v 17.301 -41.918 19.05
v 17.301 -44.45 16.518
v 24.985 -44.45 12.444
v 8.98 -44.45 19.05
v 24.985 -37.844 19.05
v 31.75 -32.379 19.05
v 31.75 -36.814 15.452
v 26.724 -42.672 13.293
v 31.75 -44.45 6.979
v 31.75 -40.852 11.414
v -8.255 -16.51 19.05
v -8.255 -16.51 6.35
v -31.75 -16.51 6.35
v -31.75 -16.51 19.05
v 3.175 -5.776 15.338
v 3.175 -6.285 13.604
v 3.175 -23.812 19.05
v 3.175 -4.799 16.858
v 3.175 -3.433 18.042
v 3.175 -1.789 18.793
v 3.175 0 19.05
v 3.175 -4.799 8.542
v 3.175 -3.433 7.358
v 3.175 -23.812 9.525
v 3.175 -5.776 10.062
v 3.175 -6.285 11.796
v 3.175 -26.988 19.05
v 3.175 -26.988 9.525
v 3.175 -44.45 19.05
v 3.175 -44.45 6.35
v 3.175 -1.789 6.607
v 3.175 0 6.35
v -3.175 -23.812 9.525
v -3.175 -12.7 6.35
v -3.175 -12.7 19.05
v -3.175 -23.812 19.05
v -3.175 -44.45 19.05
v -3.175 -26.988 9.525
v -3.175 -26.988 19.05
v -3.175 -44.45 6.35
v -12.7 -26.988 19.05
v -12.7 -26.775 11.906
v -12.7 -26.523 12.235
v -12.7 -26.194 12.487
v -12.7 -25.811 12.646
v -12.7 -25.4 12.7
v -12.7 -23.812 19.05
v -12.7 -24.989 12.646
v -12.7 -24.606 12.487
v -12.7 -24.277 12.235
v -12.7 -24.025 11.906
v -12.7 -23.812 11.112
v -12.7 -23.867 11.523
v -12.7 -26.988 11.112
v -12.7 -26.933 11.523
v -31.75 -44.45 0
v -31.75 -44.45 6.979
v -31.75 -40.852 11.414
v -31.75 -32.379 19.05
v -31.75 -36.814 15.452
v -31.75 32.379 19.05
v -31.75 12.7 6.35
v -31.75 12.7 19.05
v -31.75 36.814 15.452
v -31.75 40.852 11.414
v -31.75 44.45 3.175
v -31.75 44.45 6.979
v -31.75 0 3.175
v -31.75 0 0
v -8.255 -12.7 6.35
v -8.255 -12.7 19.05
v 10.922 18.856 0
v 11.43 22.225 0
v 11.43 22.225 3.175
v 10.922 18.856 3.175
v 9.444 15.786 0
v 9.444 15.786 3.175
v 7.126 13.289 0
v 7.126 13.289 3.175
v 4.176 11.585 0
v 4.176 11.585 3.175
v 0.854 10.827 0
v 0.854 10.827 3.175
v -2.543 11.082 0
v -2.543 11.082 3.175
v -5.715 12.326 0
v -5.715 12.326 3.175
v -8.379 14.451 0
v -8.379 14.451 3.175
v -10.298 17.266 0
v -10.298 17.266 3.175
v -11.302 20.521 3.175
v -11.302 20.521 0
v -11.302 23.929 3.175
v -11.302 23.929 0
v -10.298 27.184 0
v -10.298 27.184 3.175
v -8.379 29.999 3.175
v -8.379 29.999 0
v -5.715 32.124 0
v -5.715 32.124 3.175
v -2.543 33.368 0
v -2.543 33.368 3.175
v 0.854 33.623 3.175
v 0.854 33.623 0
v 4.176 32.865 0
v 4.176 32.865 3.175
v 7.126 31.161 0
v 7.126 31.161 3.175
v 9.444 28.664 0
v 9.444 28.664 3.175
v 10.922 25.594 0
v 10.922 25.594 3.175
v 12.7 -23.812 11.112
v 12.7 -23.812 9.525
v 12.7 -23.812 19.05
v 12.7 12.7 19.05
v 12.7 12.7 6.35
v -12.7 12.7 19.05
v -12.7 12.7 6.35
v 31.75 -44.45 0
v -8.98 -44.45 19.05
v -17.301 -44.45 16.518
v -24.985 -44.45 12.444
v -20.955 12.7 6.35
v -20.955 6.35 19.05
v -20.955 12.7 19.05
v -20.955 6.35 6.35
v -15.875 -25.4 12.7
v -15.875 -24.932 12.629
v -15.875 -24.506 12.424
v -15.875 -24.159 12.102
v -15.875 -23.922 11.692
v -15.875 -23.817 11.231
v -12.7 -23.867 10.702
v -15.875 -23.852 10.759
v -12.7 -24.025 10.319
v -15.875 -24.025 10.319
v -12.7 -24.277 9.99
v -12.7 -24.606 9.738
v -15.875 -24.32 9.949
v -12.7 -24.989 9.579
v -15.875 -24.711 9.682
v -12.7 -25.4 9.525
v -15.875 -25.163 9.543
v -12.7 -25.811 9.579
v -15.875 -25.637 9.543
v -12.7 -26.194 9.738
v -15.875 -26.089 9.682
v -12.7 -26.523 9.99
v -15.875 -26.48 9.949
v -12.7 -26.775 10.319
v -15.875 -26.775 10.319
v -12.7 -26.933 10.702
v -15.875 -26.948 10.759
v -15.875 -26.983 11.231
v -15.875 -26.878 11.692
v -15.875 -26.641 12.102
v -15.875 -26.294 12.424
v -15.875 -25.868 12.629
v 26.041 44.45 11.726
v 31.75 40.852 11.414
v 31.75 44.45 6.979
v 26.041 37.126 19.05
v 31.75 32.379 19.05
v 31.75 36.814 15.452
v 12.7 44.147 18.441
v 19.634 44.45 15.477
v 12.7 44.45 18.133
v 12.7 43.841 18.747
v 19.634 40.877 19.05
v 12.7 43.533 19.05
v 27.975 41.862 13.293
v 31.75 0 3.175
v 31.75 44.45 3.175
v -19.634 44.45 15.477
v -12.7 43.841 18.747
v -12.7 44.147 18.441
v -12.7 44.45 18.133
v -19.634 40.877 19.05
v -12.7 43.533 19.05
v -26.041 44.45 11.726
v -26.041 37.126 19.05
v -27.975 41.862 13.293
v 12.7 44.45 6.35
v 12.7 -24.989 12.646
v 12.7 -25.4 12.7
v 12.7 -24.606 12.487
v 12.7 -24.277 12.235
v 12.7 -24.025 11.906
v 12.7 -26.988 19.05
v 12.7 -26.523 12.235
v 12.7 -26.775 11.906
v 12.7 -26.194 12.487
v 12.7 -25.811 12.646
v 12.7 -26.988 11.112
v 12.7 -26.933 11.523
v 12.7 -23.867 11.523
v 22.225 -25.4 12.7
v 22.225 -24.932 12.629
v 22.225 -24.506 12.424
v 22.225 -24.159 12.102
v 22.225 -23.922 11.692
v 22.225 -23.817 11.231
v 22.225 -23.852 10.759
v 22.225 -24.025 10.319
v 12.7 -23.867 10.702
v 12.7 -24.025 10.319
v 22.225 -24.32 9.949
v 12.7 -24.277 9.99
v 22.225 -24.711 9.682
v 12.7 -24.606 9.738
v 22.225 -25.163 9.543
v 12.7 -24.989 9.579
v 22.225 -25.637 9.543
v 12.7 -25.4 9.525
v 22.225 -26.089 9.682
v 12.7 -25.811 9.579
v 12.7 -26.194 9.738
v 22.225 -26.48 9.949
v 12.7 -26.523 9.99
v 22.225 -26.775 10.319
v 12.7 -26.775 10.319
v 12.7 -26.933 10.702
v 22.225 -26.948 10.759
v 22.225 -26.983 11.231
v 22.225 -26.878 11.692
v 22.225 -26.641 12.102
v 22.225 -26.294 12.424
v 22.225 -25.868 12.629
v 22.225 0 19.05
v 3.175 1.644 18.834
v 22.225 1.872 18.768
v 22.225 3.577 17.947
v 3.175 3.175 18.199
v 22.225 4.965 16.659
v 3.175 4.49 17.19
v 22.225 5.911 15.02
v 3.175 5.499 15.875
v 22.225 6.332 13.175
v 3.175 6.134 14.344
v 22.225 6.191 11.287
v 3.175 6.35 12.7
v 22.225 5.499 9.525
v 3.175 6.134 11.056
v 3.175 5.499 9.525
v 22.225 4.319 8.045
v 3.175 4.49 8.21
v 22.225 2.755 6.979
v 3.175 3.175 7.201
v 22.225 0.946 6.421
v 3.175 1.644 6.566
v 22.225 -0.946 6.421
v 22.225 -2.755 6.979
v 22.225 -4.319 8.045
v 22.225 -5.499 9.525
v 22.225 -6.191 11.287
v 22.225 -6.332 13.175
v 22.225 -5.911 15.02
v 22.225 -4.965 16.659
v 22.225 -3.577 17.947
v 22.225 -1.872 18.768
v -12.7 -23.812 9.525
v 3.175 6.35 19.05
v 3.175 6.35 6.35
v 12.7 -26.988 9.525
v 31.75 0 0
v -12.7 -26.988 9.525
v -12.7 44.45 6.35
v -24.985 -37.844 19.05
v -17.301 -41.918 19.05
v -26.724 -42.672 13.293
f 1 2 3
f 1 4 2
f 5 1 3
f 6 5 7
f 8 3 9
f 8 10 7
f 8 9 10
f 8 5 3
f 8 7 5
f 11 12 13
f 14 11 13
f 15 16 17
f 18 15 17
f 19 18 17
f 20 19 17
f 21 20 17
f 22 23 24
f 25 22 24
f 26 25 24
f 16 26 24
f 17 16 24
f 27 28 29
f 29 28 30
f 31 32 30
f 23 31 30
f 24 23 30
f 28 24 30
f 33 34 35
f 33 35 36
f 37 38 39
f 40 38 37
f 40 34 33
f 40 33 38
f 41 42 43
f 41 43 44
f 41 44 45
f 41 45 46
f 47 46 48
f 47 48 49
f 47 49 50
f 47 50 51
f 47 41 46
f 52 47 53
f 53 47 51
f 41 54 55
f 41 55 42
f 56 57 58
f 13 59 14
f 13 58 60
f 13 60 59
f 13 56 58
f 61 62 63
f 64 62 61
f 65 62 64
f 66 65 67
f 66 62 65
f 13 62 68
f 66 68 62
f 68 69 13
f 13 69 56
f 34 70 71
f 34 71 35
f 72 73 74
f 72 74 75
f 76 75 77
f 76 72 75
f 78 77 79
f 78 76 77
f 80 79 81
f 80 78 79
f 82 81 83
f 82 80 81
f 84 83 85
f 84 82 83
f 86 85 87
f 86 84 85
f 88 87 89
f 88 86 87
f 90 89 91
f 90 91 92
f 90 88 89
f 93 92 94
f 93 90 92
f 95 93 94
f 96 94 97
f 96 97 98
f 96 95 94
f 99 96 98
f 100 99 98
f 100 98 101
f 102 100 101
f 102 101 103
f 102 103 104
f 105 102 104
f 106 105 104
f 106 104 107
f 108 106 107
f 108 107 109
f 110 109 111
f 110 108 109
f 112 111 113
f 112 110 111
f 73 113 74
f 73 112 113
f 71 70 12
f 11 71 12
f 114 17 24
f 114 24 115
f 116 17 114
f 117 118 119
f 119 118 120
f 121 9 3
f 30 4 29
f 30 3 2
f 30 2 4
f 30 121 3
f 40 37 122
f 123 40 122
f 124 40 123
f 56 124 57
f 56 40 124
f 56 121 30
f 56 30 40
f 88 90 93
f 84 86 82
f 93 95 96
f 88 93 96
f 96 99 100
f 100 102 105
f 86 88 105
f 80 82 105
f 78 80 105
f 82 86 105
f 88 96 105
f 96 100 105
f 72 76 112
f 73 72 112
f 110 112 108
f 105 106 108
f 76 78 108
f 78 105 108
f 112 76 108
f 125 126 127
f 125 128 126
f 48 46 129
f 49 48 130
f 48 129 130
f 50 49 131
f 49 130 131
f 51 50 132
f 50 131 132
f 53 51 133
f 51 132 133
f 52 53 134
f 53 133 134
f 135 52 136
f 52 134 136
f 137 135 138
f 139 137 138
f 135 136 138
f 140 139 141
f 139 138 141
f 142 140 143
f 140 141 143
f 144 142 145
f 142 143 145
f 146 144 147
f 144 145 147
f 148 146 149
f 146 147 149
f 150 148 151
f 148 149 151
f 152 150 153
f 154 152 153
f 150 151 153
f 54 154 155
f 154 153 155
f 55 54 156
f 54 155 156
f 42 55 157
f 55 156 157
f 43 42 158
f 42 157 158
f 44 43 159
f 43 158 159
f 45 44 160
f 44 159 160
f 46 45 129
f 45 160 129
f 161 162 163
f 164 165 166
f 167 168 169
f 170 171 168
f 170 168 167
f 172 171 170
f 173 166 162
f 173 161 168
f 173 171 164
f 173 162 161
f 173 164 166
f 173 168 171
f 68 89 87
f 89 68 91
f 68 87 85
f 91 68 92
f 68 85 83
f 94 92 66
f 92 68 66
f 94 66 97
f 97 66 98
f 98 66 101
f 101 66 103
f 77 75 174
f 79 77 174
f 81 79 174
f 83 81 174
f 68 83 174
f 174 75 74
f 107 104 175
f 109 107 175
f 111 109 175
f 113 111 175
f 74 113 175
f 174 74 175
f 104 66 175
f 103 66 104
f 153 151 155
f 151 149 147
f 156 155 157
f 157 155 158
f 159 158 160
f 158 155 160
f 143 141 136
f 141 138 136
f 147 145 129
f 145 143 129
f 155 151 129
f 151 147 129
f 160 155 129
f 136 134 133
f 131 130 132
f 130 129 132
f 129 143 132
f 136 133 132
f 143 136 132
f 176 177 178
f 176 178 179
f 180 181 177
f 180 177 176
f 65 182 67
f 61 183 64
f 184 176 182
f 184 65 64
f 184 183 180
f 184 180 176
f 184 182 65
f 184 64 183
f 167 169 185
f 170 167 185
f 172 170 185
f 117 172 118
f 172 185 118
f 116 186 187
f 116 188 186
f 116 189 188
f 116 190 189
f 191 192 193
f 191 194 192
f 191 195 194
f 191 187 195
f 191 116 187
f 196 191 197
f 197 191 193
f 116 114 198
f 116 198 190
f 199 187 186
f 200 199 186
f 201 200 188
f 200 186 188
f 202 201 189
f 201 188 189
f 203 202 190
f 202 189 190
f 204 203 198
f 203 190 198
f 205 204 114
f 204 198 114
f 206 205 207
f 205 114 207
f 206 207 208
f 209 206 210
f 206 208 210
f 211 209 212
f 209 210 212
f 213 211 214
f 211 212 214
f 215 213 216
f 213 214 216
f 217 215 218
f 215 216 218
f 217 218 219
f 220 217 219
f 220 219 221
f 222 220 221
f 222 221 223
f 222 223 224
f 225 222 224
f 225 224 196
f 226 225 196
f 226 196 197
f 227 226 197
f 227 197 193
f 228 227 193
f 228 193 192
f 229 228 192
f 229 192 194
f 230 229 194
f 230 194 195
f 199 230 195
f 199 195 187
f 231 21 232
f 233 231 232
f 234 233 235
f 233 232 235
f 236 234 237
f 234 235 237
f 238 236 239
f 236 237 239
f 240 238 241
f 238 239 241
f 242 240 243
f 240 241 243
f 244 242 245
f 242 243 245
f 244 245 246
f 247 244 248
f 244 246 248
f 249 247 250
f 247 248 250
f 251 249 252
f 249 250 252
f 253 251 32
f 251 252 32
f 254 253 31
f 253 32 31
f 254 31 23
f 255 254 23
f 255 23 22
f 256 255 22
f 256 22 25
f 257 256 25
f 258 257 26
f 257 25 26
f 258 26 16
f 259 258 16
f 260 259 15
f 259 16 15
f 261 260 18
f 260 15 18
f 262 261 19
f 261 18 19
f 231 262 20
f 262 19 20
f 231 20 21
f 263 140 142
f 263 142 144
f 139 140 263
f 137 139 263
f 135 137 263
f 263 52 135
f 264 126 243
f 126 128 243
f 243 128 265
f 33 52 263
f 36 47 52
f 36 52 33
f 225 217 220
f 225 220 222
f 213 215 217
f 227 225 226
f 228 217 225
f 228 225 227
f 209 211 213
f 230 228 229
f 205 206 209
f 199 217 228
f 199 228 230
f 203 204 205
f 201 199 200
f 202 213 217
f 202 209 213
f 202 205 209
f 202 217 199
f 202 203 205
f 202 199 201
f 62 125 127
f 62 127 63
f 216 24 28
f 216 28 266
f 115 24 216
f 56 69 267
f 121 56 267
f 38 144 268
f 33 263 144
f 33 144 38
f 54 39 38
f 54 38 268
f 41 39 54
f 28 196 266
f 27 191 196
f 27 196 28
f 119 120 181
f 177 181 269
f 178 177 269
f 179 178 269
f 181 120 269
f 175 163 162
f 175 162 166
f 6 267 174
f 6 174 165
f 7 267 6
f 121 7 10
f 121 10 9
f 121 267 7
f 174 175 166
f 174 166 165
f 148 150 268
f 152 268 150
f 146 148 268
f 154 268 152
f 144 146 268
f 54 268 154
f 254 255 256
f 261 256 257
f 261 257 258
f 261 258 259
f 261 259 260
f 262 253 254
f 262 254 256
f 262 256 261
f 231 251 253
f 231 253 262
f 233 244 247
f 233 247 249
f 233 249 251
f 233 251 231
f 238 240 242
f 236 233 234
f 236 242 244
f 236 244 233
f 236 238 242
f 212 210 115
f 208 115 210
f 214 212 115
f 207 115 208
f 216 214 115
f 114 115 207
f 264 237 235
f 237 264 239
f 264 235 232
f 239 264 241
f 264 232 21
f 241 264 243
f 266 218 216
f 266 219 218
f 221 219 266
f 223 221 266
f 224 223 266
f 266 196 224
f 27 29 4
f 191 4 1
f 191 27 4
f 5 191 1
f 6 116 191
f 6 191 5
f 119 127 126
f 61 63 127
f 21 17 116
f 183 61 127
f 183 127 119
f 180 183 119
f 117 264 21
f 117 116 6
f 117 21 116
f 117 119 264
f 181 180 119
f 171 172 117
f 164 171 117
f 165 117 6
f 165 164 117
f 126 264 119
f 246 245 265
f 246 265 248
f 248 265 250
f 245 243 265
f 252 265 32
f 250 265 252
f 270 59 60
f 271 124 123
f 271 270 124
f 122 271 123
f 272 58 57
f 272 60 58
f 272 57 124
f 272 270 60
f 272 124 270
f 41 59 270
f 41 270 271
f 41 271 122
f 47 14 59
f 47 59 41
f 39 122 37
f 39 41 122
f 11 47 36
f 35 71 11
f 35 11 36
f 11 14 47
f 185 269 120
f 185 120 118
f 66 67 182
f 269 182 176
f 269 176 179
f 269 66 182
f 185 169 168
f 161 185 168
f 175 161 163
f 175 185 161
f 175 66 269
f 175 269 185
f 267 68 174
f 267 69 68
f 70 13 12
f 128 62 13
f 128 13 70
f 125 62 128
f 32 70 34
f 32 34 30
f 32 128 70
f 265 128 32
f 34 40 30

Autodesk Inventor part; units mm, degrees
ref_plane "YZ Plane" through (0, 0, 0) normal (1, 0, 0) x (0, 1, 0)
ref_plane "XZ Plane" through (0, 0, 0) normal (0, 1, 0) x (-1, 0, 0)
ref_plane "XY Plane" through (0, 0, 0) normal (0, 0, 1) x (1, 0, 0)
sketch "Sketch1" plane through (0, 0, 0) normal (0, 0, 1) x (1, 0, 0)
  line L0 (31.75, -44.45) -> (-31.75, -44.45)
  line L1 (-31.75, -44.45) -> (-31.75, 44.45)
  line L2 (-31.75, 44.45) -> (31.75, 44.45)
  line L3 (31.75, 44.45) -> (31.75, -44.45)
  line L4 (31.75, -44.45) -> (-31.75, 44.45) construction
  line L5 (-31.75, -44.45) -> (31.75, 44.45) construction
  line L6 (-31.75, 0) -> (31.75, 0)
  line L7 (-31.75, 44.45) -> (31.75, 0)
  line L8 (-31.75, 0) -> (31.75, 44.45)
  circle A0 centre (0, 22.225) radius 11.43
  point P0 (0, 0)
  dimension "d0" = 63.5
  dimension "d1" = 44.45
  dimension "d2" = 22.86
extrude "Extrusion1" add sketch "Sketch1" along normal blind 3.175 contours L0 L1 L6 L3 | A0 L8 L7 | L7 L8 A0 | A0 L7 L8 | L8 L7 A0
sketch "Sketch2" plane through (0, 0, 3.175) normal (0, 0, 1) x (1, 0, 0)
  line L0 (31.75, -44.45) -> (31.75, 0) projected
  line L1 (31.75, 0) -> (-31.75, 0) projected
  line L2 (-31.75, 0) -> (-31.75, -44.45) projected
  line L3 (-31.75, -44.45) -> (31.75, -44.45) projected
  line L4 (-31.75, 44.45) -> (31.75, 44.45)
  line L5 (31.75, 44.45) -> (31.75, -44.45)
  line L6 (31.75, -44.45) -> (-31.75, -44.45)
  line L7 (-31.75, -44.45) -> (-31.75, 44.45)
  line L8 (-31.75, 44.45) -> (31.75, -44.45) construction
  line L9 (31.75, 44.45) -> (-31.75, -44.45) construction
  point P0 (0, 0)
extrude "Extrusion2" add sketch "Sketch2" along normal blind 3.175
sketch "Sketch3" plane through (0, 0, 6.35) normal (0, 0, 1) x (1, 0, 0)
  circle A0 centre (0, -0.4493) radius 54.991
  line L0 (0, -0.4493) -> (0, 0)
  line L1 (31.75, -44.45) -> (31.75, 44.45) projected
  line L2 (31.75, 44.45) -> (-31.75, 44.45) projected
  line L3 (-31.75, 44.45) -> (-31.75, -44.45) projected
  line L4 (-31.75, -44.45) -> (31.75, -44.45) projected
  line L5 (-31.75, -44.45) -> (31.75, -44.45) projected
  line L6 (0, 44.45) -> (0, -44.45)
  line L7 (31.75, 0) -> (-31.75, 0) projected
  line L8 (-31.75, 0) -> (31.75, 0)
  line L9 (12.7, 12.7) -> (-12.7, 12.7)
  line L10 (-12.7, 12.7) -> (-12.7, 44.45)
  line L11 (-12.7, 44.45) -> (12.7, 44.45)
  line L12 (12.7, 44.45) -> (12.7, 12.7)
  line L13 (12.7, 12.7) -> (-12.7, 44.45) construction
  line L14 (-12.7, 12.7) -> (12.7, 44.45) construction
  line L15 (-33.655, 6.35) -> (-8.255, 6.35)
  line L16 (-8.255, 6.35) -> (-8.255, -16.51)
  line L17 (-8.255, -16.51) -> (-33.655, -16.51)
  line L18 (-33.655, -16.51) -> (-33.655, 6.35)
  line L19 (-8.255, 6.35) -> (31.75, 6.35)
  line L20 (-8.255, -12.7) -> (-3.175, -12.7)
  line L21 (-3.175, -12.7) -> (-3.175, -44.45)
  line L22 (-20.955, 6.35) -> (-20.955, 12.7)
  line L23 (-20.955, 12.7) -> (-31.75, 12.7)
  line L24 (3.175, 6.35) -> (3.175, -44.45)
  point P0 (0, -55.4403)
  point P1 (0, 28.575)
  point P2 (3.175, -44.45)
  point P3 (-3.175, -44.45)
  point P4 (-31.75, -16.51)
  dimension "d8" = 109.982
  dimension "d9" = 25.4
  dimension "d10" = 31.75
  dimension "d11" = 25.4
  dimension "d12" = 8.255
  dimension "d13" = 6.35
  dimension "d14" = 22.86
  dimension "d15" = 5.08
  dimension "d16" = 19.05
  dimension "d17" = 6.35
extrude "Extrusion3" add sketch "Sketch3" along normal blind 12.7 contours L1 L19 L6 L9 L12 L2 | L2 L10 L9 L6 L19 L15 L22 L23 L3 | L1 L7 L24 L19 | L1 L4 L24 L7 | L17 L16 L20 L21 L4 L3
sketch "Sketch4" plane through (0, 0, 19.05) normal (0, 0, 1) x (1, 0, 0)
  line L0 (-20.955, 12.7) -> (-20.955, 6.35) projected
  line L1 (-20.955, 6.35) -> (3.175, 6.35) projected
  line L2 (3.175, 6.35) -> (3.175, -44.45) projected
  line L3 (3.175, -44.45) -> (31.75, -44.45) projected
  line L4 (31.75, -44.45) -> (31.75, 44.45) projected
  line L5 (31.75, 44.45) -> (12.7, 44.45) projected
  line L6 (12.7, 44.45) -> (12.7, 12.7) projected
  line L7 (12.7, 12.7) -> (-12.7, 12.7) projected
  line L8 (-12.7, 12.7) -> (-12.7, 44.45) projected
  line L9 (-12.7, 44.45) -> (-31.75, 44.45) projected
  line L10 (-31.75, 44.45) -> (-31.75, 12.7) projected
  line L11 (-31.75, 12.7) -> (-20.955, 12.7) projected
  line L12 (-3.175, -12.7) -> (-8.255, -12.7) projected
  line L13 (-8.255, -12.7) -> (-8.255, -16.51) projected
  line L14 (-8.255, -16.51) -> (-31.75, -16.51) projected
  line L15 (-31.75, -16.51) -> (-31.75, -44.45) projected
  line L16 (-31.75, -44.45) -> (-3.175, -44.45) projected
  line L17 (-3.175, -44.45) -> (-3.175, -12.7) projected
  line L18 (3.175, -44.45) -> (3.175, 6.35) projected
  line L19 (3.175, 6.35) -> (-20.955, 6.35) projected
  line L20 (-20.955, 6.35) -> (-20.955, 12.7) projected
  line L21 (-20.955, 12.7) -> (-31.75, 12.7) projected
  line L22 (-31.75, 12.7) -> (-31.75, -16.51) projected
  line L23 (-31.75, -16.51) -> (-8.255, -16.51) projected
  line L24 (-8.255, -16.51) -> (-8.255, -12.7) projected
  line L25 (-8.255, -12.7) -> (-3.175, -12.7) projected
  line L26 (-3.175, -12.7) -> (-3.175, -44.45) projected
  line L27 (-3.175, -44.45) -> (3.175, -44.45) projected
  line L28 (31.75, 0) -> (-31.75, 0) projected
  line L29 (-31.75, -25.4) -> (31.75, -25.4)
  line L30 (0, 0) -> (0, -44.45)
  line L31 (12.7, -26.9875) -> (-12.7, -26.9875)
  line L32 (-12.7, -26.9875) -> (-12.7, -23.8125)
  line L33 (-12.7, -23.8125) -> (12.7, -23.8125)
  line L34 (12.7, -23.8125) -> (12.7, -26.9875)
  line L35 (12.7, -26.9875) -> (-12.7, -23.8125) construction
  line L36 (-12.7, -26.9875) -> (12.7, -23.8125) construction
  point P0 (0, -25.4)
  dimension "d20" = 25.4
  dimension "d21" = 3.175
  dimension "d22" = 25.4
extrude "Extrusion4" cut sketch "Sketch4" against normal blind 9.525 contours L33 L34 L29 L2 | L2 L29 L30 L33 | L30 L29 L17 L33 | L29 L34 L31 L2 | L2 L31 L30 L29 | L32 L33 L17 L29 | L29 L17 L31 L32 | L30 L31 L17 L29
sketch "Sketch5" plane through (0, 0, 0) normal (0, 1, 0) x (-1, 0, 0)
  line L0 (-31.75, 3.175) -> (31.75, 3.175) projected
  line L1 (31.75, 3.175) -> (31.75, 19.05) projected
  line L2 (12.7, 19.05) -> (31.75, 19.05) projected
  line L3 (12.7, 6.35) -> (12.7, 19.05) projected
  line L4 (-12.7, 6.35) -> (12.7, 6.35) projected
  line L5 (-12.7, 6.35) -> (-12.7, 19.05) projected
  line L6 (-31.75, 19.05) -> (-12.7, 19.05) projected
  line L7 (-31.75, 3.175) -> (-31.75, 19.05) projected
  circle A0 centre (0, -25.4) radius 63.5
  line L8 (0, 0) -> (0, -25.4)
  circle A1 centre (0, -25.4) radius 114.3
  line L9 (0, -25.4) -> (114.3, -25.4)
  line L10 (0, -25.4) -> (0, 88.9)
  point P0 (0, 38.1)
  point P1 (63.5, -25.4)
  dimension "d25" = 28.575
  dimension "d26" = 127
  dimension "d27" = 50.8
revolve "Revolution1" cut sketch "Sketch5" angle 360 about axis through (0, 0, -25.4) along (0, 0, 1) picked at (44.2136, 61.1262) contours L10 A1 L9 A0
sketch "Sketch7" plane through (3.175, -44.45, 6.35) normal (-1, 0, 0) x (0, 0, 1)
  arc A0 (0.6288, 0) -> (12.7, 12.0712) centre (-31.75, 44.45) ccw projected
  line L0 (-6.35, 0) -> (0.6288, 0) projected
  line L1 (-6.35, 0) -> (-6.35, 44.45) projected
  line L2 (-6.35, 44.45) -> (-3.175, 44.45) projected
  line L3 (-3.175, 44.45) -> (-3.175, 88.9) projected
  line L4 (-3.175, 88.9) -> (0.6288, 88.9) projected
  arc A1 (12.7, 76.8288) -> (0.6288, 88.9) centre (-31.75, 44.45) ccw projected
  line L5 (12.7, 12.0712) -> (12.7, 76.8288) projected
  line L6 (0, 50.8) -> (12.7, 50.8) projected
  line L7 (12.7, 20.6375) -> (3.175, 20.6375) projected
  line L8 (12.7, 17.4625) -> (3.175, 17.4625) projected
  circle A2 centre (6.35, 44.45) radius 6.35
  circle A3 centre (4.7625, 19.05) radius 1.5875
  line L9 (3.175, 20.6375) -> (3.175, 17.4625) projected
  line L10 (12.7, 20.6375) -> (3.175, 20.6375) projected
  circle A4 centre (6.35, 44.45) radius 2.4478
  dimension "d37" = 12.7
  dimension "d38" = 3.175
extrude "Extrusion5" cut sketch "Sketch7" along normal mid plane 38.1 contours A3 | A2 | A4
properties part number "bunny head anchor"
